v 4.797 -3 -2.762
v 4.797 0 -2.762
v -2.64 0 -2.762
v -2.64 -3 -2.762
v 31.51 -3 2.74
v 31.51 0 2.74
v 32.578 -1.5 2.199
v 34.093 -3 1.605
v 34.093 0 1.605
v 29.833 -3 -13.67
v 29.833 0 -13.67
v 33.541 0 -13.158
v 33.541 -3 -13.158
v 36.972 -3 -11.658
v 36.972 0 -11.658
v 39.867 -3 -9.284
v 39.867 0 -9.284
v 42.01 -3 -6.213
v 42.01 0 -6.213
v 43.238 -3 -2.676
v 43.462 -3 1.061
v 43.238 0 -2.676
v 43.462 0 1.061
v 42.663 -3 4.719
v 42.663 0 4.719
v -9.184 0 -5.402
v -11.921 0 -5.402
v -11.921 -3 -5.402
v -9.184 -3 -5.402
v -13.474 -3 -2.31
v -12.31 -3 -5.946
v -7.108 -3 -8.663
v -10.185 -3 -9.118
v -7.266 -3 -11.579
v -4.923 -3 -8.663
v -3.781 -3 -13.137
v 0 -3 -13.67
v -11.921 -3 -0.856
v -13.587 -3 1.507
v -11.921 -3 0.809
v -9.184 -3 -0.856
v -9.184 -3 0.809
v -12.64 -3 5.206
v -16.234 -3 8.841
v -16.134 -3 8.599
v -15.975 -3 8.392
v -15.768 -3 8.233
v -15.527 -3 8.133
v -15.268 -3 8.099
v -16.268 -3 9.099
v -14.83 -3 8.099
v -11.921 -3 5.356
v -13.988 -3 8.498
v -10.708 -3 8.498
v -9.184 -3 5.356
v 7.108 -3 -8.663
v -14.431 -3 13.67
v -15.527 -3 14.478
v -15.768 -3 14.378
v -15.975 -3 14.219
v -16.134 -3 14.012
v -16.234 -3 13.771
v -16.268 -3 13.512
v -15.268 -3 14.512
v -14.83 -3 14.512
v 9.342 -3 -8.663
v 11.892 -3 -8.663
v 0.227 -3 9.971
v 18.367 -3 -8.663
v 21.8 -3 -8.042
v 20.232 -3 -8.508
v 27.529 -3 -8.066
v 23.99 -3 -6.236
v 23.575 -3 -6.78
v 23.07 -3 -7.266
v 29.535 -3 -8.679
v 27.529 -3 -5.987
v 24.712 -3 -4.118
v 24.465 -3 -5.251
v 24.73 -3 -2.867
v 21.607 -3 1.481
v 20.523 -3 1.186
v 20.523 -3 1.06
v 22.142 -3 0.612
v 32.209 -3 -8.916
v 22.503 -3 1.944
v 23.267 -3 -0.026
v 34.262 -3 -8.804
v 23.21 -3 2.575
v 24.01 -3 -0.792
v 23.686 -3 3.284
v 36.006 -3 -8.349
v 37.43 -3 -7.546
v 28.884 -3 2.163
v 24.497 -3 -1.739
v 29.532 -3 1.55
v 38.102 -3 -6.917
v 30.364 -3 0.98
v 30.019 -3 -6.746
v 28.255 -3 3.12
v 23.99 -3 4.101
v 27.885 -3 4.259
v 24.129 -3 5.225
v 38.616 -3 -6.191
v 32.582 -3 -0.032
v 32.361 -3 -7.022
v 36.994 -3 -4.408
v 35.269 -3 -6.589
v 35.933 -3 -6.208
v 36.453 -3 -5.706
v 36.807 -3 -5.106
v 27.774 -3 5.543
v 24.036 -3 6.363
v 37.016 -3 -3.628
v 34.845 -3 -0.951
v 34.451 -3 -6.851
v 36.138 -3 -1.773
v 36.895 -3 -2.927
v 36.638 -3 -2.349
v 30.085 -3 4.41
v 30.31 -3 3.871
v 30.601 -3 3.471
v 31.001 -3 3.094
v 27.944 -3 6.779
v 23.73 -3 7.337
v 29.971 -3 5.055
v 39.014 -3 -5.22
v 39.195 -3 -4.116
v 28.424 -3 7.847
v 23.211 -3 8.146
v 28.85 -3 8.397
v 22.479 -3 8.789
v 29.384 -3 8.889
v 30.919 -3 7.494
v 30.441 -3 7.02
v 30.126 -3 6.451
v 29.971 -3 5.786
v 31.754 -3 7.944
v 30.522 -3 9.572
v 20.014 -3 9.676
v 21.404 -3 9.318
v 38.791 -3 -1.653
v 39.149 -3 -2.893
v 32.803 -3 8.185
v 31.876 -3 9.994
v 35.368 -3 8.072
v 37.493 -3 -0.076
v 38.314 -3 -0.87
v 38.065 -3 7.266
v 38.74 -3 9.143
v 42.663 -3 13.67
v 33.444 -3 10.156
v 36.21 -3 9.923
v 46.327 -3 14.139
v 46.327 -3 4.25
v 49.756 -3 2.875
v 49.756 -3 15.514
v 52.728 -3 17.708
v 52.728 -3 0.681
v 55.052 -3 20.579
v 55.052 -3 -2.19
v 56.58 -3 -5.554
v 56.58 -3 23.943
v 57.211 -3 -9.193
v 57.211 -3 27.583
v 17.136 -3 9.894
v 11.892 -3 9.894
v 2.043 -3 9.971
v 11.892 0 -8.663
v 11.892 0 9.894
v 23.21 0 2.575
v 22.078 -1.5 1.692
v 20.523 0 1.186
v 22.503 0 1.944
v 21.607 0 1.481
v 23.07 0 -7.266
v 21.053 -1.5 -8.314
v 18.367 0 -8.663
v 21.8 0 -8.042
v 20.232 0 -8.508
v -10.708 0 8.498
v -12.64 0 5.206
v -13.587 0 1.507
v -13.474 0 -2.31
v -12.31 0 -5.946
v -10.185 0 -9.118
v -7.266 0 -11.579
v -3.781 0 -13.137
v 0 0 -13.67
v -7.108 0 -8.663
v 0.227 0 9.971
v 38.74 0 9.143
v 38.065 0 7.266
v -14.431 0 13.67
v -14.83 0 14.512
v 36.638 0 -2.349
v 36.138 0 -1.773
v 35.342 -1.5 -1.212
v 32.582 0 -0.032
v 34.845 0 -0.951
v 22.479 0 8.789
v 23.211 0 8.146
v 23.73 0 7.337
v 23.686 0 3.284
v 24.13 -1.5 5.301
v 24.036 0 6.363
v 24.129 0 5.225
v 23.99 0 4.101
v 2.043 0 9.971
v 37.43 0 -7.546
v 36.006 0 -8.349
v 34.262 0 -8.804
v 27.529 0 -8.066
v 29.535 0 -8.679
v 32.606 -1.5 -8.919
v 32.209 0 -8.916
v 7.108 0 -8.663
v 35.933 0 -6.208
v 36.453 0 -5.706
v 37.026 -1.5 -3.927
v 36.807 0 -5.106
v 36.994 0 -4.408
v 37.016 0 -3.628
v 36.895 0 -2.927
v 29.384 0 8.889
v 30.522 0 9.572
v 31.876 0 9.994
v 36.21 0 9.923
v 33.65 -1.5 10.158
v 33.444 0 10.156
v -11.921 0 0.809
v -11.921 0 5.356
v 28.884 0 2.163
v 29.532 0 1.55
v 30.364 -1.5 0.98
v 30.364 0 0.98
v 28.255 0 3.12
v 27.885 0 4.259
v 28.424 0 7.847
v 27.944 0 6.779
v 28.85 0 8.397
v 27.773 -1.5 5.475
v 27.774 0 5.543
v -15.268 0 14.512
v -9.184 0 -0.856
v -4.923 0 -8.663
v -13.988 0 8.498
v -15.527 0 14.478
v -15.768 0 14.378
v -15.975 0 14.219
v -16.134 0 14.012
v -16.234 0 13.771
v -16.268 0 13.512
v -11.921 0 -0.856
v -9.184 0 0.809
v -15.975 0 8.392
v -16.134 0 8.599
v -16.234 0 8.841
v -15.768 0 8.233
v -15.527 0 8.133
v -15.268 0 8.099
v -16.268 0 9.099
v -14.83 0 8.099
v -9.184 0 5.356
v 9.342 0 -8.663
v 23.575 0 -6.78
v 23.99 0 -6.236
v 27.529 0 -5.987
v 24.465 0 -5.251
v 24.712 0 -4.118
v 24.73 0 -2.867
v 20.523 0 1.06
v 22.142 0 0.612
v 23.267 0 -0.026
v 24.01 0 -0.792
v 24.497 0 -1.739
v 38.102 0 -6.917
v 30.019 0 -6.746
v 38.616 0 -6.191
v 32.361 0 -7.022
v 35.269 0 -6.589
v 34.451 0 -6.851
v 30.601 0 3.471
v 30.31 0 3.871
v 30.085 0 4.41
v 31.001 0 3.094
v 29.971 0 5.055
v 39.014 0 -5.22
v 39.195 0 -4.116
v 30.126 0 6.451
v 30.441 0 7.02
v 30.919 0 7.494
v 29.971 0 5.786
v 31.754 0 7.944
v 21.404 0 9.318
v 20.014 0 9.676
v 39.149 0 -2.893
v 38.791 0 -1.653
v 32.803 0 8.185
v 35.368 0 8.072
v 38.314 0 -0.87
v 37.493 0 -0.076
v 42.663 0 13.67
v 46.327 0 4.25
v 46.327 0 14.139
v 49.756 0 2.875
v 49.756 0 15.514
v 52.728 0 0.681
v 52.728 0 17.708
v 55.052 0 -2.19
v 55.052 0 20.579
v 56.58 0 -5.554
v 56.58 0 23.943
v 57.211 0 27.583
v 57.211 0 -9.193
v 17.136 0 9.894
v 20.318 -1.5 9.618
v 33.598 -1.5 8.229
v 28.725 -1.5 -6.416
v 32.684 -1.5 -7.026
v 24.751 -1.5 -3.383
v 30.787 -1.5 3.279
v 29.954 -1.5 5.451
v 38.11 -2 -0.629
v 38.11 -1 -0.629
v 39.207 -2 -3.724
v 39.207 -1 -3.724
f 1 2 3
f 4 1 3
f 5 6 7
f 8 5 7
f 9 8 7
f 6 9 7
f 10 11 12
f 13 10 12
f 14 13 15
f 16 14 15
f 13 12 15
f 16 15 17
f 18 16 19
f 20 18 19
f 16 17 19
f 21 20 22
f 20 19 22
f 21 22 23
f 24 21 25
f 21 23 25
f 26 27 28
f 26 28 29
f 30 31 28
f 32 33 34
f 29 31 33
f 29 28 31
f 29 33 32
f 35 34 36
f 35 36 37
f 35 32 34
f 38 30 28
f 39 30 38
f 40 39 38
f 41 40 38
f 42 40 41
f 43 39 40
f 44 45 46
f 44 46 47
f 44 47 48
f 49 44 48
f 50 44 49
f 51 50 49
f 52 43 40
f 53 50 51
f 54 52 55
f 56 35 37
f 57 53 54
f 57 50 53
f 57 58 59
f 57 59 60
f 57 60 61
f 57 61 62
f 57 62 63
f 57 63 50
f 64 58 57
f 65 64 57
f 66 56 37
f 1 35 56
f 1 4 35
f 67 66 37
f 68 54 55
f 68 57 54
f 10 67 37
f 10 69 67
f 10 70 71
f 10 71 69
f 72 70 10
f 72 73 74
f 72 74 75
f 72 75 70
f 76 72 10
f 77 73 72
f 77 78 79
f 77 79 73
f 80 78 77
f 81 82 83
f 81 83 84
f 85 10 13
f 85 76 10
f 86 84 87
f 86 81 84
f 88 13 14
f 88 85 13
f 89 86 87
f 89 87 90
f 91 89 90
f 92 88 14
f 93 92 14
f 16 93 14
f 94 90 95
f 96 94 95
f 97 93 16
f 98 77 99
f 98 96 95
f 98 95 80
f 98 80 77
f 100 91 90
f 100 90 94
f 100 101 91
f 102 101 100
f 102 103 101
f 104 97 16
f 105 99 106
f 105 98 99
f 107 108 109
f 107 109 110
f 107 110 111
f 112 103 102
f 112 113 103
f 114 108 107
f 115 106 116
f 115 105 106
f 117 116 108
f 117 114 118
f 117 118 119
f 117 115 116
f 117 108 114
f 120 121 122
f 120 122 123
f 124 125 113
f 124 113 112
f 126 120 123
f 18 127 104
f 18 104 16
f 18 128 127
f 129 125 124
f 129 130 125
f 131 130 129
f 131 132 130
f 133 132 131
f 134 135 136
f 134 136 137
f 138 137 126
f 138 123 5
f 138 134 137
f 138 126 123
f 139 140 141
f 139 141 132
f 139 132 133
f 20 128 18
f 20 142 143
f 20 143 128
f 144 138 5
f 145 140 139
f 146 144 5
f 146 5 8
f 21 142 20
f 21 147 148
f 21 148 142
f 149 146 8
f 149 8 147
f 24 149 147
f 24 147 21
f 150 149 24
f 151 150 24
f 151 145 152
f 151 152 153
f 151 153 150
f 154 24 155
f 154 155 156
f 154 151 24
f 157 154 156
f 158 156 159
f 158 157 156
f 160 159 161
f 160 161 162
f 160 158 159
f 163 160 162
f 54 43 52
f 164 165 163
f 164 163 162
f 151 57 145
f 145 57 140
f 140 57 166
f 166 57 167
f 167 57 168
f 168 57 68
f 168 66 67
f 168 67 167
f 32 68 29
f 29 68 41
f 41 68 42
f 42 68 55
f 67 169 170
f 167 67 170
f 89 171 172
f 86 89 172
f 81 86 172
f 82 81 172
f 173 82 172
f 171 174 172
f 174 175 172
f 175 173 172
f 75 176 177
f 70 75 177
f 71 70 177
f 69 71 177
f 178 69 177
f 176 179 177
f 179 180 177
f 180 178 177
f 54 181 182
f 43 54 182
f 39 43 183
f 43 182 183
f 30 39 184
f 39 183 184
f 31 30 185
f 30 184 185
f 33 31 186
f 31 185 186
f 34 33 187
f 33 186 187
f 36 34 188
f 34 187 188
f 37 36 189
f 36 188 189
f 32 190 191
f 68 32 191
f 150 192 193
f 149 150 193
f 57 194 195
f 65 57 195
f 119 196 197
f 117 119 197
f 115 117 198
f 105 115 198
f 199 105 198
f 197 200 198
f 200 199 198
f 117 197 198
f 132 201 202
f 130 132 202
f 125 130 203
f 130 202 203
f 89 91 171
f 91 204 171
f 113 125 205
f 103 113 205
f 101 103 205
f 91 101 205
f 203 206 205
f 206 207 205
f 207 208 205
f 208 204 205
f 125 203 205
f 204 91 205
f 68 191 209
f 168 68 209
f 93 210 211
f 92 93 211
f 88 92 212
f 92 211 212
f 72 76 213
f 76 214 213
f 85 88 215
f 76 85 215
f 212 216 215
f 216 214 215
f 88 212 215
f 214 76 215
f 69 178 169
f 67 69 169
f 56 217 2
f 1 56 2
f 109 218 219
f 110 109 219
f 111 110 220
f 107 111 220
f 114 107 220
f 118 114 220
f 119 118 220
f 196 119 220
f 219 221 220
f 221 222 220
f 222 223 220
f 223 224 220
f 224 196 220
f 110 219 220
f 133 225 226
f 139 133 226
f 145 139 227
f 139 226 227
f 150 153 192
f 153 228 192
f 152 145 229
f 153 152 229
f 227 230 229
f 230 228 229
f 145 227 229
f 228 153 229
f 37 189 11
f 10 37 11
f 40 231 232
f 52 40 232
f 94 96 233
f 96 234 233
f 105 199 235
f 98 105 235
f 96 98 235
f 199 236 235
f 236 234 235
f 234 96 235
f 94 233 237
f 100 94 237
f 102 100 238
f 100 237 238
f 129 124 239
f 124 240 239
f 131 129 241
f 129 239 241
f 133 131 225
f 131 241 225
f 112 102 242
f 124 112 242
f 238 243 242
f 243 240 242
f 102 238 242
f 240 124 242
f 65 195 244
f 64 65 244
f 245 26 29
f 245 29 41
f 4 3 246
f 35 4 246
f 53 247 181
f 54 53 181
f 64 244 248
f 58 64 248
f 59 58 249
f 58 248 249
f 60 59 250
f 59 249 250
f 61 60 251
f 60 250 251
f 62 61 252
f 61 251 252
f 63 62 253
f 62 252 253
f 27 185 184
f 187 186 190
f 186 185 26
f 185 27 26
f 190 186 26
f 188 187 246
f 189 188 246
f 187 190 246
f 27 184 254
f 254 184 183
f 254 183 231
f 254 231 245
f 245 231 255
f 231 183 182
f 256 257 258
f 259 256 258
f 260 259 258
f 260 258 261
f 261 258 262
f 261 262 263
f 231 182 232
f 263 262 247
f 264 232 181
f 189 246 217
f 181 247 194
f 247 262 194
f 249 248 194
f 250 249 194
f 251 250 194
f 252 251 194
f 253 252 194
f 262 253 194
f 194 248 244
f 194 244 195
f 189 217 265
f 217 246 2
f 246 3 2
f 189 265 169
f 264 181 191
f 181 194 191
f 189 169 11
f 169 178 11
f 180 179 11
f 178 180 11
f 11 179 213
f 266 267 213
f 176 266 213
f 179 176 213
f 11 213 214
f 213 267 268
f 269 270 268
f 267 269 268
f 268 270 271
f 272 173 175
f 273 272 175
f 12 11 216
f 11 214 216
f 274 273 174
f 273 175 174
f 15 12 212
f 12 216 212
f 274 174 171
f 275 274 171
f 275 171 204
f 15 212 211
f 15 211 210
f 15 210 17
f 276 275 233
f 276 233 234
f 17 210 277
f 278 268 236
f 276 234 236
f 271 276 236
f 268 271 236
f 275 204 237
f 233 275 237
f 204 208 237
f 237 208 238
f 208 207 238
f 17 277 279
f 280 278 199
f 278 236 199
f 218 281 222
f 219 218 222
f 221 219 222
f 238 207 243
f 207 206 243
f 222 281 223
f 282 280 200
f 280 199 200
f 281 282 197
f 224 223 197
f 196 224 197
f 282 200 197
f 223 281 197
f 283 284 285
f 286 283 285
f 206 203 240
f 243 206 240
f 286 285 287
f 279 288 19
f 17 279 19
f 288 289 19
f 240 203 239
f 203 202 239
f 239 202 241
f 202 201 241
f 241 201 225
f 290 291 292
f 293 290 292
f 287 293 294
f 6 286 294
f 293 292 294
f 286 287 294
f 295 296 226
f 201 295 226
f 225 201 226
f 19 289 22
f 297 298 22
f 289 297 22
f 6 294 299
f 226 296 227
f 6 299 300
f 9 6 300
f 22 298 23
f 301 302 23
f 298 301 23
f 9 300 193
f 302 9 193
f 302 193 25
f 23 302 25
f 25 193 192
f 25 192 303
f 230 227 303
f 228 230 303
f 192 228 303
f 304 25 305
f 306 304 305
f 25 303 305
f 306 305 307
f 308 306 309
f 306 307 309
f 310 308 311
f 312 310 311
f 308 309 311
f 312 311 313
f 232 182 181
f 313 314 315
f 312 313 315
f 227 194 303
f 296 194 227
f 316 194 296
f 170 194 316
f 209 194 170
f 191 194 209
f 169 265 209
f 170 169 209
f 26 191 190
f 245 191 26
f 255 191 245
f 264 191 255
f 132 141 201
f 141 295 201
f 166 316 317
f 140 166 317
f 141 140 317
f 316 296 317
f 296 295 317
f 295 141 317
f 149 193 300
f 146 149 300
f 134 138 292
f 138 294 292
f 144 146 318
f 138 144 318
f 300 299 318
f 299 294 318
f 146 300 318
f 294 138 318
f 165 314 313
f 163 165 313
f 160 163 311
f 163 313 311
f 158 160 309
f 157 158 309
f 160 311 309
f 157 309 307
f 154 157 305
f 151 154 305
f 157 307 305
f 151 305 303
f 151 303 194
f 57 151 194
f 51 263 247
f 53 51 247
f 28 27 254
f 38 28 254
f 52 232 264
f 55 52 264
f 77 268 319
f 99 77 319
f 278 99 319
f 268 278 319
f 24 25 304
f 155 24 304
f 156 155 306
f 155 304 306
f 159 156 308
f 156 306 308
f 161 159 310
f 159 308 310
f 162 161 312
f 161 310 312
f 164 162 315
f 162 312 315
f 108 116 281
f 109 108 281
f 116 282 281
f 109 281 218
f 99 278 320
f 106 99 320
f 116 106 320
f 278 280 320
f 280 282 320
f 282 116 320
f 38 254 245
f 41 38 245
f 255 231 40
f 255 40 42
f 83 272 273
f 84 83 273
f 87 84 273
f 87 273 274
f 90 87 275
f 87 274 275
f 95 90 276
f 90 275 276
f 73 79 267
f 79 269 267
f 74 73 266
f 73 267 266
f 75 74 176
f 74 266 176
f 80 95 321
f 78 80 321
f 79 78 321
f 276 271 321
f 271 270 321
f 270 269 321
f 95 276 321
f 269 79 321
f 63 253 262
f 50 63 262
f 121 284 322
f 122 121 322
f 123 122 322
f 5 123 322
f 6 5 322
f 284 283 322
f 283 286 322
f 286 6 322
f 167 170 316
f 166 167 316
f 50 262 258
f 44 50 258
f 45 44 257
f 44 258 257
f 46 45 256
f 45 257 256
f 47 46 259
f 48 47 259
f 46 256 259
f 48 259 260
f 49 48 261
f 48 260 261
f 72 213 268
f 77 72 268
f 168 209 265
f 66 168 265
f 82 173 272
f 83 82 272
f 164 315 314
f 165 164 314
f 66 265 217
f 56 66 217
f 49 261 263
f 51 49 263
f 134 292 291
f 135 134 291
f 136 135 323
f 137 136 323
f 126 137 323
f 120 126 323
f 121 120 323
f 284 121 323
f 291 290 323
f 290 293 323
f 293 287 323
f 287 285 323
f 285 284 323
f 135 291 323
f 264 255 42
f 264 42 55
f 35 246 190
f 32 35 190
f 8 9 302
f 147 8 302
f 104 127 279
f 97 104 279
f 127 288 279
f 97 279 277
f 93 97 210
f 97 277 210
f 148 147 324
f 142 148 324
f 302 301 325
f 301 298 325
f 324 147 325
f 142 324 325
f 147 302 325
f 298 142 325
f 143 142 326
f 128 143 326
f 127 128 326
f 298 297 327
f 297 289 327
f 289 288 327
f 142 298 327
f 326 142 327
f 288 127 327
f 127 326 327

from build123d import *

# Parameters (mm, degrees)
F0_W     = 2.7374038473
F0_H     = 4.5464726281
F1_DEPTH = 3


with BuildPart() as f1:
    # F0 (on Front) → F1 (new body)
    with BuildSketch(Plane.XZ):
        with BuildLine():
            Line((-13.9879264009, 8.4983842463), (-10.7078288449, 8.4983842463))
            ThreePointArc((-10.7078288449, 8.4983842463), (-12.3096819162, -5.9457433928), (0, -13.6704108706))
            Line((0, -13.6704108706), (29.832560569, -13.6704108706))
            ThreePointArc((29.832560569, -13.6704108706), (41.0439649972, -7.8220549805), (42.6626390029, 4.7190275219))
            ThreePointArc((42.6626390029, 4.7190275219), (52.7277631814, 0.6811115523), (57.2114773095, -9.193492122))
            Line((57.2114773095, -9.193492122), (57.2114773095, 27.5829305145))
            ThreePointArc((57.2114773095, 27.5829305145), (52.7277631814, 17.7083268402), (42.6626390029, 13.6704108706))
            Line((42.6626390029, 13.6704108706), (29.832560569, 13.6704108706))
            Line((29.832560569, 13.6704108706), (0, 13.6704108706))
            Line((0, 13.6704108706), (-14.4307379611, 13.6704108706))
            Line((-14.4307379611, 13.6704108706), (-14.8297163701, 14.5122008398))
            Line((-14.8297163701, 14.5122008398), (-15.268201828, 14.5122008398))
            ThreePointArc((-15.268201828, 14.5122008398), (-15.9753086092, 14.219307621), (-16.268201828, 13.5122008398))
            Line((-16.268201828, 13.5122008398), (-16.268201828, 9.0994058373))
            ThreePointArc((-16.268201828, 9.0994058373), (-15.9753086092, 8.3922990562), (-15.268201828, 8.0994058373))
            Line((-15.268201828, 8.0994058373), (-14.8297163701, 8.0994058373))
            Line((-14.8297163701, 8.0994058373), (-13.9879264009, 8.4983842463))
        make_face()
        with Locations((-10.5523099191, -3.12910098)):
            Rectangle(F0_W, F0_H, mode=Mode.SUBTRACT)
        Polygon((9.3416453156, -8.6632125312), (7.1077647943, -8.6632125312), (4.7967138551, -2.7617063542), (-2.6400774802, -2.7617063542), (-4.9226972128, -8.6632125312), (-7.1078385226, -8.6632125312), (0.2274127889, 9.9714126168), (2.0429484125, 9.9714126168), align=None, mode=Mode.SUBTRACT)
        with Locations((-10.5523099191, 3.0826488801)):
            Rectangle(F0_W, F0_H, mode=Mode.SUBTRACT)
        with BuildLine():
            Line((11.8923307107, -8.6632125312), (11.8923307107, 9.8942421988))
            Line((11.8923307107, 9.8942421988), (17.1358575342, 9.8942421988))
            add(Edge.make_bspline(
                [(17.1358575342, 9.8942421988), (20.8278527957, 9.8942421988), (22.4788935809, 8.7894867411)],
                knots=[0, 0, 0, 1, 1, 1], degree=2))
            add(Edge.make_bspline(
                [(22.4788935809, 8.7894867411), (24.1299343662, 7.6847312833), (24.1299343662, 5.300571527)],
                knots=[0, 0, 0, 1, 1, 1], degree=2))
            add(Edge.make_bspline(
                [(24.1299343662, 5.300571527), (24.1299343662, 3.6474999413), (23.2099817515, 2.5752372911)],
                knots=[0, 0, 0, 1, 1, 1], degree=2))
            add(Edge.make_bspline(
                [(23.2099817515, 2.5752372911), (22.2900291369, 1.5029746409), (20.5232327246, 1.1861697669)],
                knots=[0, 0, 0, 1, 1, 1], degree=2))
            Line((20.5232327246, 1.1861697669), (20.5232327246, 1.0602601376))
            add(Edge.make_bspline(
                [(20.5232327246, 1.0602601376), (24.7513593112, 0.3372951689), (24.7513593112, -3.3831312992)],
                knots=[0, 0, 0, 1, 1, 1], degree=2))
            add(Edge.make_bspline(
                [(24.7513593112, -3.3831312992), (24.7513593112, -5.8688310792), (23.0698565188, -7.2660218052)],
                knots=[0, 0, 0, 1, 1, 1], degree=2))
            add(Edge.make_bspline(
                [(23.0698565188, -7.2660218052), (21.3883537265, -8.6632125312), (18.3665226214, -8.6632125312)],
                knots=[0, 0, 0, 1, 1, 1], degree=2))
            Line((18.3665226214, -8.6632125312), (11.8923307107, -8.6632125312))
        make_face(mode=Mode.SUBTRACT)
        with BuildLine():
            add(Edge.make_bspline(
                [(38.1099648282, -0.6293658567), (39.2065970841, -1.8234765353), (39.2065970841, -3.7243057788)],
                knots=[0, 0, 0, 1, 1, 1], degree=2))
            add(Edge.make_bspline(
                [(39.2065970841, -3.7243057788), (39.2065970841, -6.1734511503), (37.4296466694, -7.5462722706)],
                knots=[0, 0, 0, 1, 1, 1], degree=2))
            add(Edge.make_bspline(
                [(37.4296466694, -7.5462722706), (35.6526962548, -8.919093391), (32.606495544, -8.919093391)],
                knots=[0, 0, 0, 1, 1, 1], degree=2))
            add(Edge.make_bspline(
                [(32.606495544, -8.919093391), (29.3084755745, -8.919093391), (27.5294943594, -8.0661571919)],
                knots=[0, 0, 0, 1, 1, 1], degree=2))
            Line((27.5294943594, -8.0661571919), (27.5294943594, -5.9866175067))
            add(Edge.make_bspline(
                [(27.5294943594, -5.9866175067), (28.6748658267, -6.4658864185), (30.0192557403, -6.7461368839)],
                knots=[0, 0, 0, 1, 1, 1], degree=2))
            add(Edge.make_bspline(
                [(30.0192557403, -6.7461368839), (31.363645654, -7.0263873493), (32.683665962, -7.0263873493)],
                knots=[0, 0, 0, 1, 1, 1], degree=2))
            add(Edge.make_bspline(
                [(32.683665962, -7.0263873493), (34.8403760653, -7.0263873493), (35.9329467202, -6.2079747584)],
                knots=[0, 0, 0, 1, 1, 1], degree=2))
            add(Edge.make_bspline(
                [(35.9329467202, -6.2079747584), (37.0255173751, -5.3895621674), (37.0255173751, -3.9273858262)],
                knots=[0, 0, 0, 1, 1, 1], degree=2))
            add(Edge.make_bspline(
                [(37.0255173751, -3.9273858262), (37.0255173751, -2.9647864016), (36.6376344846, -2.349453858)],
                knots=[0, 0, 0, 1, 1, 1], degree=2))
            add(Edge.make_bspline(
                [(36.6376344846, -2.349453858), (36.2497515941, -1.7341213145), (35.3419837823, -1.2122055927)],
                knots=[0, 0, 0, 1, 1, 1], degree=2))
            add(Edge.make_bspline(
                [(35.3419837823, -1.2122055927), (34.4342159705, -0.6902898709), (32.5821259383, -0.0323105174)],
                knots=[0, 0, 0, 1, 1, 1], degree=2))
            add(Edge.make_bspline(
                [(32.5821259383, -0.0323105174), (29.9948861347, 0.8937344987), (28.8840382755, 2.1629847949)],
                knots=[0, 0, 0, 1, 1, 1], degree=2))
            add(Edge.make_bspline(
                [(28.8840382755, 2.1629847949), (27.7731904163, 3.432235091), (27.7731904163, 5.4752203677)],
                knots=[0, 0, 0, 1, 1, 1], degree=2))
            add(Edge.make_bspline(
                [(27.7731904163, 5.4752203677), (27.7731904163, 7.6197456681), (29.383615192, 8.8889959643)],
                knots=[0, 0, 0, 1, 1, 1], degree=2))
            add(Edge.make_bspline(
                [(29.383615192, 8.8889959643), (30.9940399678, 10.1582462604), (33.6503269876, 10.1582462604)],
                knots=[0, 0, 0, 1, 1, 1], degree=2))
            add(Edge.make_bspline(
                [(33.6503269876, 10.1582462604), (36.416277233, 10.1582462604), (38.7395129751, 9.1428460235)],
                knots=[0, 0, 0, 1, 1, 1], degree=2))
            Line((38.7395129751, 9.1428460235), (38.0652872178, 7.2663863857))
            add(Edge.make_bspline(
                [(38.0652872178, 7.2663863857), (35.7664210814, 8.2289858103), (33.5975261753, 8.2289858103)],
                knots=[0, 0, 0, 1, 1, 1], degree=2))
            add(Edge.make_bspline(
                [(33.5975261753, 8.2289858103), (31.8835305753, 8.2289858103), (30.9189003503, 7.4938360387)],
                knots=[0, 0, 0, 1, 1, 1], degree=2))
            add(Edge.make_bspline(
                [(30.9189003503, 7.4938360387), (29.9542701252, 6.7586862672), (29.9542701252, 5.450850762)],
                knots=[0, 0, 0, 1, 1, 1], degree=2))
            add(Edge.make_bspline(
                [(29.9542701252, 5.450850762), (29.9542701252, 4.4882513374), (30.3096602081, 3.8708879934)],
                knots=[0, 0, 0, 1, 1, 1], degree=2))
            add(Edge.make_bspline(
                [(30.3096602081, 3.8708879934), (30.665050291, 3.2535246493), (31.5098632882, 2.7397321294)],
                knots=[0, 0, 0, 1, 1, 1], degree=2))
            add(Edge.make_bspline(
                [(31.5098632882, 2.7397321294), (32.3546762853, 2.2259396096), (34.0930414909, 1.6045146646)],
                knots=[0, 0, 0, 1, 1, 1], degree=2))
            add(Edge.make_bspline(
                [(34.0930414909, 1.6045146646), (37.0133325723, 0.5647448219), (38.1099648282, -0.6293658567)],
                knots=[0, 0, 0, 1, 1, 1], degree=2))
        make_face(mode=Mode.SUBTRACT)
    extrude(amount=F1_DEPTH)


solid = f1.part
